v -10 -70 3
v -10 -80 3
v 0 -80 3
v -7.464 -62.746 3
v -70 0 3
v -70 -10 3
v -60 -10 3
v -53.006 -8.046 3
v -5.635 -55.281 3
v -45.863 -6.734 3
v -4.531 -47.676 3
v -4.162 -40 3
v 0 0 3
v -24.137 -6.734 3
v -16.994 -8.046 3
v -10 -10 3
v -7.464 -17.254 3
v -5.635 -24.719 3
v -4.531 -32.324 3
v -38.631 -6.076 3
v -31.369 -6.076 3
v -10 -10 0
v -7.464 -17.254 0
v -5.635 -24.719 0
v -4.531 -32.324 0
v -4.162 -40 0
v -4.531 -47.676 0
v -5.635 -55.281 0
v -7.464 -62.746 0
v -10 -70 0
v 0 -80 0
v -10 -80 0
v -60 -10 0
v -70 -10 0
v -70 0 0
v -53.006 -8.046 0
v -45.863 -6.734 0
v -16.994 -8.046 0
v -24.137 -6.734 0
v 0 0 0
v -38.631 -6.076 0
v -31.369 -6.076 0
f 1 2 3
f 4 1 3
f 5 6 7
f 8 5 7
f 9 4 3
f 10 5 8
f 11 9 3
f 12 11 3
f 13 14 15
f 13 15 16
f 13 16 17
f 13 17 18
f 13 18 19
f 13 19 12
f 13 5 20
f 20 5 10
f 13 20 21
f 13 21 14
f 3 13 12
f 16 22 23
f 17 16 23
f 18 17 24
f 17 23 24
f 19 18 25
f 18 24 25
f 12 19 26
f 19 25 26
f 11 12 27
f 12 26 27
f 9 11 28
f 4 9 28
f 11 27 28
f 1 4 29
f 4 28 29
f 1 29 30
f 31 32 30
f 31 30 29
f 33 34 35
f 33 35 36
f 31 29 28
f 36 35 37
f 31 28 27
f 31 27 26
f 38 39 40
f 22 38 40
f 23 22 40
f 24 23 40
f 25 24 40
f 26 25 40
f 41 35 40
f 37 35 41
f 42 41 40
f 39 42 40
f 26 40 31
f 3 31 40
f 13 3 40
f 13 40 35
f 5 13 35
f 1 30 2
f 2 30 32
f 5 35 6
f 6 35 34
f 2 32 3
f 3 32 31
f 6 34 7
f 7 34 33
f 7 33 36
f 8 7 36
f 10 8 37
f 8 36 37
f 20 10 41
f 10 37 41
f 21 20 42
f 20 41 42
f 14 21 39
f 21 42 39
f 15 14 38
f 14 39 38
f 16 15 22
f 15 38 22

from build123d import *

# Parameters (mm, degrees)
BOSS_EXTRUDE1_DEPTH = 3


with BuildPart() as part:
    # Sketch1 → Boss-Extrude1 (new body)
    with BuildSketch(Plane.XY):
        with BuildLine():
            Line((0, 0), (-70, 0))
            Line((-70, 0), (-70, -10))
            Line((-70, -10), (-60, -10))
            ThreePointArc((-60, -10), (-35, -5.993420768), (-10, -10))
            ThreePointArc((-10, -10), (-4.161984871, -40), (-10, -70))
            Line((-10, -70), (-10, -80))
            Line((-10, -80), (0, -80))
            Line((0, -80), (0, 0))
        make_face()
    extrude(amount=BOSS_EXTRUDE1_DEPTH)


solid = part.part
